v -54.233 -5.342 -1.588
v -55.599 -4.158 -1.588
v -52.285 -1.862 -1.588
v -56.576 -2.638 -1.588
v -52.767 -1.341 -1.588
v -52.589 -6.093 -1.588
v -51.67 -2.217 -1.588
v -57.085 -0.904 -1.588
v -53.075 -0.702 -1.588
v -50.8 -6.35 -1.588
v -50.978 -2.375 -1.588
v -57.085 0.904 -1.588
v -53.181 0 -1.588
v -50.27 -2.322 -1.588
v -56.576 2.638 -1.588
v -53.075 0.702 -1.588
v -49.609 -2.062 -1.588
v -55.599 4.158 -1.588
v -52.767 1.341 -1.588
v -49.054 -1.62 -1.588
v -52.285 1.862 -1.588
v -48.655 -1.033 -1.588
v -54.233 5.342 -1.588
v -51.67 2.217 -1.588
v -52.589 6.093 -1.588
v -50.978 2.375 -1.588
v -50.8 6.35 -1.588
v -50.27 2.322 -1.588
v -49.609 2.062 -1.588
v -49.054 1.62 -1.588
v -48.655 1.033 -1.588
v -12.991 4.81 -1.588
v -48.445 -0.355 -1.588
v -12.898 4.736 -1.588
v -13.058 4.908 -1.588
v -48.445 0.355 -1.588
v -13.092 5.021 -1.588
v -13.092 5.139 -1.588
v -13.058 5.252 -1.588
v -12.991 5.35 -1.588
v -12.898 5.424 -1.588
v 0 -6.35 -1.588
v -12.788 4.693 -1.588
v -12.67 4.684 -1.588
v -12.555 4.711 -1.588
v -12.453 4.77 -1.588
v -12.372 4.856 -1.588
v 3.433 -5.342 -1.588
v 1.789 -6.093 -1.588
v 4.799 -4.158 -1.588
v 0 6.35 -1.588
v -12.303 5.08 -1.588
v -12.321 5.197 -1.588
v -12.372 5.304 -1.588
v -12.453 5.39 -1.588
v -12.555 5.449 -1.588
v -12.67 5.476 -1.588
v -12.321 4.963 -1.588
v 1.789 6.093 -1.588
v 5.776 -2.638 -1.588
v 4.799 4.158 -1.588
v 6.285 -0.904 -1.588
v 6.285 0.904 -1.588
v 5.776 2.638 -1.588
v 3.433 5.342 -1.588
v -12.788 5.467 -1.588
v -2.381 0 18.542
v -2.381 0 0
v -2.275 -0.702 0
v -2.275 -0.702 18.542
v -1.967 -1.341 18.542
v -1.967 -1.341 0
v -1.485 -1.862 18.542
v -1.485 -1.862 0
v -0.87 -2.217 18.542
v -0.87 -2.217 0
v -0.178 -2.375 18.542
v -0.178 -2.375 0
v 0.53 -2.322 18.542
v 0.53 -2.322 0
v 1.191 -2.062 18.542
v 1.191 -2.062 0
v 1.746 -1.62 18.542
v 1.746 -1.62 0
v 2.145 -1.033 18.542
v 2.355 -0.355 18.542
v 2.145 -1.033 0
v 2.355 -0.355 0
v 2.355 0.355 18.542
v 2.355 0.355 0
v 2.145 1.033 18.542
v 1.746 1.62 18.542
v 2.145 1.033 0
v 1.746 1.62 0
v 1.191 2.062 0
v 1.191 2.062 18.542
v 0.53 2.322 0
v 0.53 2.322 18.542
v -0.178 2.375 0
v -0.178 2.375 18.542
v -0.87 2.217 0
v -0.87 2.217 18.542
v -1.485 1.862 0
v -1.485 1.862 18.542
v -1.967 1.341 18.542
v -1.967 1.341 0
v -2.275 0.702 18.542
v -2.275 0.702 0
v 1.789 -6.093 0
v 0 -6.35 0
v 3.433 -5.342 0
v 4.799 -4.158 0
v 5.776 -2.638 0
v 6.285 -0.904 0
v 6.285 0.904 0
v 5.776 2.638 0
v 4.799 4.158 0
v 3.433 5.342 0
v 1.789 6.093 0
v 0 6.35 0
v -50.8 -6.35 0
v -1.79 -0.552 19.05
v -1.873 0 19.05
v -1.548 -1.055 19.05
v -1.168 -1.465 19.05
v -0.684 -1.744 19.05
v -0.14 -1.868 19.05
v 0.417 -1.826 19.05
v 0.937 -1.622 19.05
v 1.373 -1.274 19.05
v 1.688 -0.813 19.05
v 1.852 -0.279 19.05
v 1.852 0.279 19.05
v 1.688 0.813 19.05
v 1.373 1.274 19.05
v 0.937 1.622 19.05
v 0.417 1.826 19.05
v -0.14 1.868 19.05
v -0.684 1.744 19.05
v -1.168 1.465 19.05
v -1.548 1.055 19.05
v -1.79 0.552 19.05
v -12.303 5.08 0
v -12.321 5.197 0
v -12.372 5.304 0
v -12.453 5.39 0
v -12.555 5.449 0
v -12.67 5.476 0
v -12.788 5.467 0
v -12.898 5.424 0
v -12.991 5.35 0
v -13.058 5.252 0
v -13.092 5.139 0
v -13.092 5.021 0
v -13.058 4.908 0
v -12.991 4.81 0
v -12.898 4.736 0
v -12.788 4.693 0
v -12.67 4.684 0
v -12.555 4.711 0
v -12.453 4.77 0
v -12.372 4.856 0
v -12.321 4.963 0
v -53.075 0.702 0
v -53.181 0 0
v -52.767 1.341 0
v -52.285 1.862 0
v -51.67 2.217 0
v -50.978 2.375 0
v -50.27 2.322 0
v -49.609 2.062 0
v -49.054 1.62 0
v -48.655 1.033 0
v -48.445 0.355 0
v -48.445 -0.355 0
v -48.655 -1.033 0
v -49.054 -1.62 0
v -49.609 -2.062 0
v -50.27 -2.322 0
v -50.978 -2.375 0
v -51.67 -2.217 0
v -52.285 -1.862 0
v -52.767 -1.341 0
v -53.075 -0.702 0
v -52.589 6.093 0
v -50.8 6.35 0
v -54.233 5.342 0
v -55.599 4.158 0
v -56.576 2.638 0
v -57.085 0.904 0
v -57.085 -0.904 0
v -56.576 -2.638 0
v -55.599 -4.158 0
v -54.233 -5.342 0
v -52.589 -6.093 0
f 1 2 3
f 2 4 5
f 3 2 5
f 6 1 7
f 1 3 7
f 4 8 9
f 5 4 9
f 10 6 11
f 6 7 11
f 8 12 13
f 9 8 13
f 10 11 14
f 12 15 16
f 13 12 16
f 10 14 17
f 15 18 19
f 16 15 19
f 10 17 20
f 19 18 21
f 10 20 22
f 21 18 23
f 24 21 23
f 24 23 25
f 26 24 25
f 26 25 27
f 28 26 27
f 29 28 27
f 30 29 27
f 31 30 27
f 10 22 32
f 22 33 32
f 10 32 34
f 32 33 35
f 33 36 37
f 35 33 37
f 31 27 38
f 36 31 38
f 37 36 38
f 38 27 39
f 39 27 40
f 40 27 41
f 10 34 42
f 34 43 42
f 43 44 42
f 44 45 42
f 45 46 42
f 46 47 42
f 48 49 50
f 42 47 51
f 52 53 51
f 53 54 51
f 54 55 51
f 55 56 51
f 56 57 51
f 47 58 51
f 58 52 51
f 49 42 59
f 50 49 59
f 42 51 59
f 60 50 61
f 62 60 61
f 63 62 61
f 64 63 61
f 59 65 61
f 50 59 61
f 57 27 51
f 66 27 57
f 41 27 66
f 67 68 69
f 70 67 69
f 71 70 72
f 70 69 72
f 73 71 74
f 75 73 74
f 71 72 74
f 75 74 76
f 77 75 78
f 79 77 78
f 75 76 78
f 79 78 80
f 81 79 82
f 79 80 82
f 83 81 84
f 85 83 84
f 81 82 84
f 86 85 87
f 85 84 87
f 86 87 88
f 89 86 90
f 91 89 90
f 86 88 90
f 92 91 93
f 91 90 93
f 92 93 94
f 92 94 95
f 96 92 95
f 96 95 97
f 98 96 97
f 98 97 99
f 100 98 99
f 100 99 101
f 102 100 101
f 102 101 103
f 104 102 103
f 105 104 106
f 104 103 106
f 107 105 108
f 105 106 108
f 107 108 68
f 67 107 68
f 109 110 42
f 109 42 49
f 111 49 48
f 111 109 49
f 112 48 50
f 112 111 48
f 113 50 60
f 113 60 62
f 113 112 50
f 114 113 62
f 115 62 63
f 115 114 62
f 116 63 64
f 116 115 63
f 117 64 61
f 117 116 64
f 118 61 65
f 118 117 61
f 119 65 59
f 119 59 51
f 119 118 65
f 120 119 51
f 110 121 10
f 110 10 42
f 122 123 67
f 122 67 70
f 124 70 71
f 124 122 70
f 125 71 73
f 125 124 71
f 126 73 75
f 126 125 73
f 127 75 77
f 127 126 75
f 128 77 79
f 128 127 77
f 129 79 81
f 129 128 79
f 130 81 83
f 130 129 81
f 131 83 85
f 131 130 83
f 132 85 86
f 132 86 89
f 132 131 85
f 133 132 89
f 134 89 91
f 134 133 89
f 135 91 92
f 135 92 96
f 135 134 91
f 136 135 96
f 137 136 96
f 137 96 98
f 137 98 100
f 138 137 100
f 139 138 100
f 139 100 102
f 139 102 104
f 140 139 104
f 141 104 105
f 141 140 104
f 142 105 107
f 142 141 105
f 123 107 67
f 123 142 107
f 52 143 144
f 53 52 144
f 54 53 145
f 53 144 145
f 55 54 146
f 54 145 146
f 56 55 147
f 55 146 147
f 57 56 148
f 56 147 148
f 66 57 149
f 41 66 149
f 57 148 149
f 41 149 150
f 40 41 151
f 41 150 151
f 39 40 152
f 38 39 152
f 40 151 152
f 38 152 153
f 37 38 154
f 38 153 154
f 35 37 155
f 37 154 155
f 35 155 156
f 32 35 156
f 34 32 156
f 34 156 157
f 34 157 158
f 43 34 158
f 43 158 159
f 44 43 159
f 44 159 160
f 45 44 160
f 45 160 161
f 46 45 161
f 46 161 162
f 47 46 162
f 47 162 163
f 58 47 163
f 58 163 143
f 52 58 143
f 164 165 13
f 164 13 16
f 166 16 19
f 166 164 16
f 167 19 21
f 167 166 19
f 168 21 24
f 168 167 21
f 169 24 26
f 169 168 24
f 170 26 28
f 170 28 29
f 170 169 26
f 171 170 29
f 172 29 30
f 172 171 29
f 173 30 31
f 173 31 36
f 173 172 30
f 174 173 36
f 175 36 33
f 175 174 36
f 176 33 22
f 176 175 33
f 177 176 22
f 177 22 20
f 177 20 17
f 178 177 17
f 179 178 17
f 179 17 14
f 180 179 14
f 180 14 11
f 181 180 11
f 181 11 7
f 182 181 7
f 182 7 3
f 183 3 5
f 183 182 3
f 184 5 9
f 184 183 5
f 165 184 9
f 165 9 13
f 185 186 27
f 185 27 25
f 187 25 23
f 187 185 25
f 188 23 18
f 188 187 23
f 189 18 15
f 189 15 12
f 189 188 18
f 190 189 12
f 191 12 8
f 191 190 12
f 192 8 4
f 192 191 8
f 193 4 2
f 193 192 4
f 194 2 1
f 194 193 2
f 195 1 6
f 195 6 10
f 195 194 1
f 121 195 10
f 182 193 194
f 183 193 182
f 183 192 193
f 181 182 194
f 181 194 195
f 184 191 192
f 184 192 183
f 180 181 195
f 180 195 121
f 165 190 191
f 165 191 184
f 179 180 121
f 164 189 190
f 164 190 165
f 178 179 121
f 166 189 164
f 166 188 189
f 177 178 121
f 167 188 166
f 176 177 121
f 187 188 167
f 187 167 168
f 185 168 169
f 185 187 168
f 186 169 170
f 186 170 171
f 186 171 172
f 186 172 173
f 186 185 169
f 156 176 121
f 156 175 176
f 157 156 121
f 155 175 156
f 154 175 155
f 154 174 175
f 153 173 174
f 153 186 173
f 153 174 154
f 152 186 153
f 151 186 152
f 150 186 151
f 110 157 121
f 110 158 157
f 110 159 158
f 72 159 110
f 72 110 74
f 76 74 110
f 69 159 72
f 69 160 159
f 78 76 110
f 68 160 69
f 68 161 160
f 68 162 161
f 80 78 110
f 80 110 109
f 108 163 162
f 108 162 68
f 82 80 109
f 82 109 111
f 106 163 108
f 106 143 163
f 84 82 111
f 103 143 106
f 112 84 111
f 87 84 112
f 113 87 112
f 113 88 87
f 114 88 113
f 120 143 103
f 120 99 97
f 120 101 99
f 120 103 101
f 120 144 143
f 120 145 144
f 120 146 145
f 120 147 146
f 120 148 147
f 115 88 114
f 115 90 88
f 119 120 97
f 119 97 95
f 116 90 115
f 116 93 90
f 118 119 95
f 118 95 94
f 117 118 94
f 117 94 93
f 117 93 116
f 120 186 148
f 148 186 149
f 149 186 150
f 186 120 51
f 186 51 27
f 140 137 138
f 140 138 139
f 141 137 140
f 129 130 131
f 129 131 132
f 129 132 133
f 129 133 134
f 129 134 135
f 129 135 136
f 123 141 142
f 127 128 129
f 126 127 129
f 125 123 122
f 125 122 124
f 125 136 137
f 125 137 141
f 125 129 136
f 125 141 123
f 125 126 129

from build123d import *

# Parameters (mm, degrees)
SKETCH1_R           = 2.38125
BOSS_EXTRUDE1_DEPTH = 19.05
CHAMFER1_SIZE       = 0.508
SKETCH3_R           = 2.38125
BOSS_EXTRUDE2_DEPTH = 1.5875
SKETCH4_R           = 0.396875
CUT_EXTRUDE3_DEPTH  = 61.57513929


with BuildPart() as part:
    # Sketch1 → Boss-Extrude1 (new body)
    with BuildSketch(Plane.XY):
        with Locations(Location((0, 0, 0), (0, 0, 180))):
            Circle(SKETCH1_R)
    extrude(amount=BOSS_EXTRUDE1_DEPTH)

    # Chamfer1
    chamfer1_edges = [part.edges().sort_by_distance(p)[0] for p in [
        (2.38125, 0, 19.05),
    ]]
    chamfer(chamfer1_edges, length=CHAMFER1_SIZE)

    # Sketch3 → Boss-Extrude2 (add)
    with BuildSketch(Plane(origin=(0, 0, 0), x_dir=(-1, 0, 0), z_dir=(0, 0, -1))):
        with BuildLine():
            Line((0, 6.35), (50.8, 6.35))
            ThreePointArc((50.8, 6.35), (57.15, 0), (50.8, -6.35))
            Line((50.8, -6.35), (0, -6.35))
            ThreePointArc((0, -6.35), (-6.35, 0), (0, 6.35))
        make_face()
        with Locations((50.8, 0)):
            Circle(SKETCH3_R, mode=Mode.SUBTRACT)
    extrude(amount=BOSS_EXTRUDE2_DEPTH)

    # Sketch4 → Cut-Extrude3 (cut, through all)
    with BuildSketch(Plane.XY):
        with Locations((-12.7, 5.08)):
            Circle(SKETCH4_R)
    extrude(amount=-CUT_EXTRUDE3_DEPTH, mode=Mode.SUBTRACT)


solid = part.part
